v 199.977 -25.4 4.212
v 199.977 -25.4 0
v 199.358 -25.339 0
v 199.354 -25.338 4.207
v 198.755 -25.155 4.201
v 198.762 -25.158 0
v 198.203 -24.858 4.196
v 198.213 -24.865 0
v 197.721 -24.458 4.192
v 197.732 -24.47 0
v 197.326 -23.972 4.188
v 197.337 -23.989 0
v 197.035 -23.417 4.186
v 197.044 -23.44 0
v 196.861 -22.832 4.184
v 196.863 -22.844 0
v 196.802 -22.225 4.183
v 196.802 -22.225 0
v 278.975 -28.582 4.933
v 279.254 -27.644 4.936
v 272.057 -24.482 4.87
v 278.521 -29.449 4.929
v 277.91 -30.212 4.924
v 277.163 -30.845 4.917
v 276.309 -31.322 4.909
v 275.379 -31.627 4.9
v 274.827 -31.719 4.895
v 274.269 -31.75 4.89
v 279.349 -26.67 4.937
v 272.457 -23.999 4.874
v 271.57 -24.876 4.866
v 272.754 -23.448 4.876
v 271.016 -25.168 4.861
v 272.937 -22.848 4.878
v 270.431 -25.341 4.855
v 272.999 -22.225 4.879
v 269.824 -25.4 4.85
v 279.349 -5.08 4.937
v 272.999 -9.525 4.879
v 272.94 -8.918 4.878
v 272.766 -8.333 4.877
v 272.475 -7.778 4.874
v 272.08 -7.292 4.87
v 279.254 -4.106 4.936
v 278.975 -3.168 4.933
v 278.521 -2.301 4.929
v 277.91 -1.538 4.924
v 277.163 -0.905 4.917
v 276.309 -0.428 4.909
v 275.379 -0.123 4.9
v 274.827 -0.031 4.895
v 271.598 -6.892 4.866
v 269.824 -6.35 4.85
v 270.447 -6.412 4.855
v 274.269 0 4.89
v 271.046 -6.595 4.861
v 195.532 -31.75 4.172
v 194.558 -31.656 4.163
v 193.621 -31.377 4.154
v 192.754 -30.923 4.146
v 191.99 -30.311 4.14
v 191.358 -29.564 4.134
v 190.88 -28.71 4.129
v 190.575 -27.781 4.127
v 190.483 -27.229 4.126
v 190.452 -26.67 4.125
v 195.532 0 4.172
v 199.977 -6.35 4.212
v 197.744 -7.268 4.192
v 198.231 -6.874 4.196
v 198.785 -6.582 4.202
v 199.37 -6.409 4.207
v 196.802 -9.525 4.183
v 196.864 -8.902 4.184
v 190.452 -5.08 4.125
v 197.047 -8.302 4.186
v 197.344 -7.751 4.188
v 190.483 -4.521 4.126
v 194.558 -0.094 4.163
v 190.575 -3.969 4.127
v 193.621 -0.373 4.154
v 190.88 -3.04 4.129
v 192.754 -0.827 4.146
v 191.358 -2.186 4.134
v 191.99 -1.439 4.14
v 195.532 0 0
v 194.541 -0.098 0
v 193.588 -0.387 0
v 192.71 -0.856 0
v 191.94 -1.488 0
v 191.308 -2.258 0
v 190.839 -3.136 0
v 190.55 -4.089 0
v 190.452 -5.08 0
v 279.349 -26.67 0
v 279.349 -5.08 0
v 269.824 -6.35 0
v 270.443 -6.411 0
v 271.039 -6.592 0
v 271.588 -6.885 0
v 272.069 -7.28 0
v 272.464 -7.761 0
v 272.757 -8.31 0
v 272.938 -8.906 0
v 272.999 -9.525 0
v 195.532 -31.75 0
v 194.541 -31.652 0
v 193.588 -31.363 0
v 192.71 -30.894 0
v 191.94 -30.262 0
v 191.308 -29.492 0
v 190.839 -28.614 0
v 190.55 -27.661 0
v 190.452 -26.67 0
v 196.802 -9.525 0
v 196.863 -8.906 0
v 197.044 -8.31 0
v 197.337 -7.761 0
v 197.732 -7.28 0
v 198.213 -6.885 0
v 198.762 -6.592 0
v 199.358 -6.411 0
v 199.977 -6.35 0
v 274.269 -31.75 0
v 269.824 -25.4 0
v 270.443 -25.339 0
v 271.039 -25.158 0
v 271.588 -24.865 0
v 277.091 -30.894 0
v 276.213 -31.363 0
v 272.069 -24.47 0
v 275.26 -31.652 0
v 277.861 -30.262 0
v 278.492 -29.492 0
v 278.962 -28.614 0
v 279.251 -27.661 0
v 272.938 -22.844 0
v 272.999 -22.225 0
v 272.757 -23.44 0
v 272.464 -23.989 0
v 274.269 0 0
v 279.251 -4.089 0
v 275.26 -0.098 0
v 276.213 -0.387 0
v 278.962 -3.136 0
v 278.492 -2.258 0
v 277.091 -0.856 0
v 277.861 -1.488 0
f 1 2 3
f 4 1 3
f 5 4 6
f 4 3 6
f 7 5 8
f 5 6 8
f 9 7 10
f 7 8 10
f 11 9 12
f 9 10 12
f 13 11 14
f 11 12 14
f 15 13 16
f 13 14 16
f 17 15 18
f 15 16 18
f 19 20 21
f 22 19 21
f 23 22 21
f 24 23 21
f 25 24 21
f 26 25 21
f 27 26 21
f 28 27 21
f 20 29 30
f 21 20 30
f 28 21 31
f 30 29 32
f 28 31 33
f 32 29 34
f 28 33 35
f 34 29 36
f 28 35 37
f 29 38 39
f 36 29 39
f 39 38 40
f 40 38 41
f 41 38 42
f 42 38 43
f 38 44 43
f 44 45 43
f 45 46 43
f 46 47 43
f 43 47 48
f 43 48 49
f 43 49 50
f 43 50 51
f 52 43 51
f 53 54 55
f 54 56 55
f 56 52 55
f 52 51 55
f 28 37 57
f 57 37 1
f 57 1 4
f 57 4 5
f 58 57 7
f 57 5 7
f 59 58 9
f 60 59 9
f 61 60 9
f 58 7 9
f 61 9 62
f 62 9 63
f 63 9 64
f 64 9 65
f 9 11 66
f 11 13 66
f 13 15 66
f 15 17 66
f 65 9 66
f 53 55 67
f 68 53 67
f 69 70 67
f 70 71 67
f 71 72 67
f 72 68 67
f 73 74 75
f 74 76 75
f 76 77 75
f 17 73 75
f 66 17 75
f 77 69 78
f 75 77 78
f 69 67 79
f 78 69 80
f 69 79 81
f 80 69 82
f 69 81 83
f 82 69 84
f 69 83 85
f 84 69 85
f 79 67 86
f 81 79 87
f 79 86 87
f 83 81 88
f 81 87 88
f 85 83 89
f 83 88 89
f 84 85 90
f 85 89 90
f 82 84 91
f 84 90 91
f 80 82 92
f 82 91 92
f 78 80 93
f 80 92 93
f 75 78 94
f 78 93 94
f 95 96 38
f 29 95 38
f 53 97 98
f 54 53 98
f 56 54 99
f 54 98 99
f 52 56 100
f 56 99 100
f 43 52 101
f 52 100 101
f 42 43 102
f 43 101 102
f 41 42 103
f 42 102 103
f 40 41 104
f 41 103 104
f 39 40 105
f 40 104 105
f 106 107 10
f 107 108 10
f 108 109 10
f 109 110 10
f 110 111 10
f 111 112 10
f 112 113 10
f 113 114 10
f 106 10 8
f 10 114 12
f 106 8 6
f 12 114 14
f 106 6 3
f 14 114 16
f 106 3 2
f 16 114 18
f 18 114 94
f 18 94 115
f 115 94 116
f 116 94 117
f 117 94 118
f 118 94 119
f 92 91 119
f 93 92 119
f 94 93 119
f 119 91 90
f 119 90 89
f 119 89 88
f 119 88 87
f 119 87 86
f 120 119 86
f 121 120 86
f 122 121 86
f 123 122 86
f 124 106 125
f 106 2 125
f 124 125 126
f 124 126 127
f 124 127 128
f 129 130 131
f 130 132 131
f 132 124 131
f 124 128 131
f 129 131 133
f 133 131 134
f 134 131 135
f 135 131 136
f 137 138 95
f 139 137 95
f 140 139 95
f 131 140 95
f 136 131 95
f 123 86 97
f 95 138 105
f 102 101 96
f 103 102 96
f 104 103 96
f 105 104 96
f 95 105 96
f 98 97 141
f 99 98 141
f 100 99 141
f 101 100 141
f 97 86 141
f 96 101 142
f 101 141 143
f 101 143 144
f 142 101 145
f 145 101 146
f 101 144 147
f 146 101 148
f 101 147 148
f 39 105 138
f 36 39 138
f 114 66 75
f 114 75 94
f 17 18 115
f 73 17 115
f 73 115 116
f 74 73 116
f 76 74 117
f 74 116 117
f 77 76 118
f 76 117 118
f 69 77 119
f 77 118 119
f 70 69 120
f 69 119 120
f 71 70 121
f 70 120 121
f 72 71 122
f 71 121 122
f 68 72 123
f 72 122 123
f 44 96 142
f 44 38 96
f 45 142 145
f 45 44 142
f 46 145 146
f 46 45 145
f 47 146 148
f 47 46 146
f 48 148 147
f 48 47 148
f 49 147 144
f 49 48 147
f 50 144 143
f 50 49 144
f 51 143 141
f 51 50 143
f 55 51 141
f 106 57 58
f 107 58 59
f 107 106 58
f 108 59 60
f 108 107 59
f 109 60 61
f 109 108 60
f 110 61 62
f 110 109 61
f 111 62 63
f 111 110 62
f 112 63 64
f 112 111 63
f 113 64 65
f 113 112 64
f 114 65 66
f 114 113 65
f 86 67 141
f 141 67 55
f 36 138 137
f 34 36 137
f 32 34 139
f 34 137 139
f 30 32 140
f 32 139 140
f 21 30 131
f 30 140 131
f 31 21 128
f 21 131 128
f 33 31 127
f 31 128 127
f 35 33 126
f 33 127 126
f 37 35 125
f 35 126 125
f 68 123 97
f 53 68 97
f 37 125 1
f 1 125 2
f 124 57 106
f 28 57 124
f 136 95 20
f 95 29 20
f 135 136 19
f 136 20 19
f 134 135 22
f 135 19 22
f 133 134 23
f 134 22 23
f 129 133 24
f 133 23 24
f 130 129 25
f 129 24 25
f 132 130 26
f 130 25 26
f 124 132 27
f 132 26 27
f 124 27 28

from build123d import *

# Parameters (mm, degrees)
F4_DEPTH = 31.75
F6_DEPTH = 4.937656
F7_R     = 5.08


with BuildPart() as f4:
    # F3 (on face) → F4 (new body)
    with BuildSketch(Plane.XZ):
        Polygon((279.348608, 0), (279.348608, 4.936656), (190.452309, 4.125477), (190.452309, 0), align=None)
    extrude(amount=F4_DEPTH)

    # F5 (on face) → F6 (cut, through all)
    with BuildSketch(Plane(origin=(0, 0, 0), x_dir=(1, 0, 0), z_dir=(0, 0, -1))):
        with BuildLine():
            Line((269.823608, 25.4), (199.977309, 25.4))
            ThreePointArc((199.977309, 25.4), (197.732245, 24.470064), (196.802309, 22.225))
            Line((196.802309, 22.225), (196.802309, 9.525))
            ThreePointArc((196.802309, 9.525), (197.732245, 7.279936), (199.977309, 6.35))
            Line((199.977309, 6.35), (269.823608, 6.35))
            ThreePointArc((269.823608, 6.35), (272.068672, 7.279936), (272.998608, 9.525))
            Line((272.998608, 9.525), (272.998608, 22.225))
            ThreePointArc((272.998608, 22.225), (272.068672, 24.470064), (269.823608, 25.4))
        make_face()
    extrude(amount=-F6_DEPTH, mode=Mode.SUBTRACT)

    # F7
    f7_edges = [f4.edges().sort_by_distance(p)[0] for p in [
        (279.348608, -31.75, 2.468328),
        (190.452309, -31.75, 2.062739),
        (190.452309, 0, 2.062739),
        (279.348608, 0, 2.468328),
    ]]
    fillet(f7_edges, radius=F7_R)


solid = f4.part
